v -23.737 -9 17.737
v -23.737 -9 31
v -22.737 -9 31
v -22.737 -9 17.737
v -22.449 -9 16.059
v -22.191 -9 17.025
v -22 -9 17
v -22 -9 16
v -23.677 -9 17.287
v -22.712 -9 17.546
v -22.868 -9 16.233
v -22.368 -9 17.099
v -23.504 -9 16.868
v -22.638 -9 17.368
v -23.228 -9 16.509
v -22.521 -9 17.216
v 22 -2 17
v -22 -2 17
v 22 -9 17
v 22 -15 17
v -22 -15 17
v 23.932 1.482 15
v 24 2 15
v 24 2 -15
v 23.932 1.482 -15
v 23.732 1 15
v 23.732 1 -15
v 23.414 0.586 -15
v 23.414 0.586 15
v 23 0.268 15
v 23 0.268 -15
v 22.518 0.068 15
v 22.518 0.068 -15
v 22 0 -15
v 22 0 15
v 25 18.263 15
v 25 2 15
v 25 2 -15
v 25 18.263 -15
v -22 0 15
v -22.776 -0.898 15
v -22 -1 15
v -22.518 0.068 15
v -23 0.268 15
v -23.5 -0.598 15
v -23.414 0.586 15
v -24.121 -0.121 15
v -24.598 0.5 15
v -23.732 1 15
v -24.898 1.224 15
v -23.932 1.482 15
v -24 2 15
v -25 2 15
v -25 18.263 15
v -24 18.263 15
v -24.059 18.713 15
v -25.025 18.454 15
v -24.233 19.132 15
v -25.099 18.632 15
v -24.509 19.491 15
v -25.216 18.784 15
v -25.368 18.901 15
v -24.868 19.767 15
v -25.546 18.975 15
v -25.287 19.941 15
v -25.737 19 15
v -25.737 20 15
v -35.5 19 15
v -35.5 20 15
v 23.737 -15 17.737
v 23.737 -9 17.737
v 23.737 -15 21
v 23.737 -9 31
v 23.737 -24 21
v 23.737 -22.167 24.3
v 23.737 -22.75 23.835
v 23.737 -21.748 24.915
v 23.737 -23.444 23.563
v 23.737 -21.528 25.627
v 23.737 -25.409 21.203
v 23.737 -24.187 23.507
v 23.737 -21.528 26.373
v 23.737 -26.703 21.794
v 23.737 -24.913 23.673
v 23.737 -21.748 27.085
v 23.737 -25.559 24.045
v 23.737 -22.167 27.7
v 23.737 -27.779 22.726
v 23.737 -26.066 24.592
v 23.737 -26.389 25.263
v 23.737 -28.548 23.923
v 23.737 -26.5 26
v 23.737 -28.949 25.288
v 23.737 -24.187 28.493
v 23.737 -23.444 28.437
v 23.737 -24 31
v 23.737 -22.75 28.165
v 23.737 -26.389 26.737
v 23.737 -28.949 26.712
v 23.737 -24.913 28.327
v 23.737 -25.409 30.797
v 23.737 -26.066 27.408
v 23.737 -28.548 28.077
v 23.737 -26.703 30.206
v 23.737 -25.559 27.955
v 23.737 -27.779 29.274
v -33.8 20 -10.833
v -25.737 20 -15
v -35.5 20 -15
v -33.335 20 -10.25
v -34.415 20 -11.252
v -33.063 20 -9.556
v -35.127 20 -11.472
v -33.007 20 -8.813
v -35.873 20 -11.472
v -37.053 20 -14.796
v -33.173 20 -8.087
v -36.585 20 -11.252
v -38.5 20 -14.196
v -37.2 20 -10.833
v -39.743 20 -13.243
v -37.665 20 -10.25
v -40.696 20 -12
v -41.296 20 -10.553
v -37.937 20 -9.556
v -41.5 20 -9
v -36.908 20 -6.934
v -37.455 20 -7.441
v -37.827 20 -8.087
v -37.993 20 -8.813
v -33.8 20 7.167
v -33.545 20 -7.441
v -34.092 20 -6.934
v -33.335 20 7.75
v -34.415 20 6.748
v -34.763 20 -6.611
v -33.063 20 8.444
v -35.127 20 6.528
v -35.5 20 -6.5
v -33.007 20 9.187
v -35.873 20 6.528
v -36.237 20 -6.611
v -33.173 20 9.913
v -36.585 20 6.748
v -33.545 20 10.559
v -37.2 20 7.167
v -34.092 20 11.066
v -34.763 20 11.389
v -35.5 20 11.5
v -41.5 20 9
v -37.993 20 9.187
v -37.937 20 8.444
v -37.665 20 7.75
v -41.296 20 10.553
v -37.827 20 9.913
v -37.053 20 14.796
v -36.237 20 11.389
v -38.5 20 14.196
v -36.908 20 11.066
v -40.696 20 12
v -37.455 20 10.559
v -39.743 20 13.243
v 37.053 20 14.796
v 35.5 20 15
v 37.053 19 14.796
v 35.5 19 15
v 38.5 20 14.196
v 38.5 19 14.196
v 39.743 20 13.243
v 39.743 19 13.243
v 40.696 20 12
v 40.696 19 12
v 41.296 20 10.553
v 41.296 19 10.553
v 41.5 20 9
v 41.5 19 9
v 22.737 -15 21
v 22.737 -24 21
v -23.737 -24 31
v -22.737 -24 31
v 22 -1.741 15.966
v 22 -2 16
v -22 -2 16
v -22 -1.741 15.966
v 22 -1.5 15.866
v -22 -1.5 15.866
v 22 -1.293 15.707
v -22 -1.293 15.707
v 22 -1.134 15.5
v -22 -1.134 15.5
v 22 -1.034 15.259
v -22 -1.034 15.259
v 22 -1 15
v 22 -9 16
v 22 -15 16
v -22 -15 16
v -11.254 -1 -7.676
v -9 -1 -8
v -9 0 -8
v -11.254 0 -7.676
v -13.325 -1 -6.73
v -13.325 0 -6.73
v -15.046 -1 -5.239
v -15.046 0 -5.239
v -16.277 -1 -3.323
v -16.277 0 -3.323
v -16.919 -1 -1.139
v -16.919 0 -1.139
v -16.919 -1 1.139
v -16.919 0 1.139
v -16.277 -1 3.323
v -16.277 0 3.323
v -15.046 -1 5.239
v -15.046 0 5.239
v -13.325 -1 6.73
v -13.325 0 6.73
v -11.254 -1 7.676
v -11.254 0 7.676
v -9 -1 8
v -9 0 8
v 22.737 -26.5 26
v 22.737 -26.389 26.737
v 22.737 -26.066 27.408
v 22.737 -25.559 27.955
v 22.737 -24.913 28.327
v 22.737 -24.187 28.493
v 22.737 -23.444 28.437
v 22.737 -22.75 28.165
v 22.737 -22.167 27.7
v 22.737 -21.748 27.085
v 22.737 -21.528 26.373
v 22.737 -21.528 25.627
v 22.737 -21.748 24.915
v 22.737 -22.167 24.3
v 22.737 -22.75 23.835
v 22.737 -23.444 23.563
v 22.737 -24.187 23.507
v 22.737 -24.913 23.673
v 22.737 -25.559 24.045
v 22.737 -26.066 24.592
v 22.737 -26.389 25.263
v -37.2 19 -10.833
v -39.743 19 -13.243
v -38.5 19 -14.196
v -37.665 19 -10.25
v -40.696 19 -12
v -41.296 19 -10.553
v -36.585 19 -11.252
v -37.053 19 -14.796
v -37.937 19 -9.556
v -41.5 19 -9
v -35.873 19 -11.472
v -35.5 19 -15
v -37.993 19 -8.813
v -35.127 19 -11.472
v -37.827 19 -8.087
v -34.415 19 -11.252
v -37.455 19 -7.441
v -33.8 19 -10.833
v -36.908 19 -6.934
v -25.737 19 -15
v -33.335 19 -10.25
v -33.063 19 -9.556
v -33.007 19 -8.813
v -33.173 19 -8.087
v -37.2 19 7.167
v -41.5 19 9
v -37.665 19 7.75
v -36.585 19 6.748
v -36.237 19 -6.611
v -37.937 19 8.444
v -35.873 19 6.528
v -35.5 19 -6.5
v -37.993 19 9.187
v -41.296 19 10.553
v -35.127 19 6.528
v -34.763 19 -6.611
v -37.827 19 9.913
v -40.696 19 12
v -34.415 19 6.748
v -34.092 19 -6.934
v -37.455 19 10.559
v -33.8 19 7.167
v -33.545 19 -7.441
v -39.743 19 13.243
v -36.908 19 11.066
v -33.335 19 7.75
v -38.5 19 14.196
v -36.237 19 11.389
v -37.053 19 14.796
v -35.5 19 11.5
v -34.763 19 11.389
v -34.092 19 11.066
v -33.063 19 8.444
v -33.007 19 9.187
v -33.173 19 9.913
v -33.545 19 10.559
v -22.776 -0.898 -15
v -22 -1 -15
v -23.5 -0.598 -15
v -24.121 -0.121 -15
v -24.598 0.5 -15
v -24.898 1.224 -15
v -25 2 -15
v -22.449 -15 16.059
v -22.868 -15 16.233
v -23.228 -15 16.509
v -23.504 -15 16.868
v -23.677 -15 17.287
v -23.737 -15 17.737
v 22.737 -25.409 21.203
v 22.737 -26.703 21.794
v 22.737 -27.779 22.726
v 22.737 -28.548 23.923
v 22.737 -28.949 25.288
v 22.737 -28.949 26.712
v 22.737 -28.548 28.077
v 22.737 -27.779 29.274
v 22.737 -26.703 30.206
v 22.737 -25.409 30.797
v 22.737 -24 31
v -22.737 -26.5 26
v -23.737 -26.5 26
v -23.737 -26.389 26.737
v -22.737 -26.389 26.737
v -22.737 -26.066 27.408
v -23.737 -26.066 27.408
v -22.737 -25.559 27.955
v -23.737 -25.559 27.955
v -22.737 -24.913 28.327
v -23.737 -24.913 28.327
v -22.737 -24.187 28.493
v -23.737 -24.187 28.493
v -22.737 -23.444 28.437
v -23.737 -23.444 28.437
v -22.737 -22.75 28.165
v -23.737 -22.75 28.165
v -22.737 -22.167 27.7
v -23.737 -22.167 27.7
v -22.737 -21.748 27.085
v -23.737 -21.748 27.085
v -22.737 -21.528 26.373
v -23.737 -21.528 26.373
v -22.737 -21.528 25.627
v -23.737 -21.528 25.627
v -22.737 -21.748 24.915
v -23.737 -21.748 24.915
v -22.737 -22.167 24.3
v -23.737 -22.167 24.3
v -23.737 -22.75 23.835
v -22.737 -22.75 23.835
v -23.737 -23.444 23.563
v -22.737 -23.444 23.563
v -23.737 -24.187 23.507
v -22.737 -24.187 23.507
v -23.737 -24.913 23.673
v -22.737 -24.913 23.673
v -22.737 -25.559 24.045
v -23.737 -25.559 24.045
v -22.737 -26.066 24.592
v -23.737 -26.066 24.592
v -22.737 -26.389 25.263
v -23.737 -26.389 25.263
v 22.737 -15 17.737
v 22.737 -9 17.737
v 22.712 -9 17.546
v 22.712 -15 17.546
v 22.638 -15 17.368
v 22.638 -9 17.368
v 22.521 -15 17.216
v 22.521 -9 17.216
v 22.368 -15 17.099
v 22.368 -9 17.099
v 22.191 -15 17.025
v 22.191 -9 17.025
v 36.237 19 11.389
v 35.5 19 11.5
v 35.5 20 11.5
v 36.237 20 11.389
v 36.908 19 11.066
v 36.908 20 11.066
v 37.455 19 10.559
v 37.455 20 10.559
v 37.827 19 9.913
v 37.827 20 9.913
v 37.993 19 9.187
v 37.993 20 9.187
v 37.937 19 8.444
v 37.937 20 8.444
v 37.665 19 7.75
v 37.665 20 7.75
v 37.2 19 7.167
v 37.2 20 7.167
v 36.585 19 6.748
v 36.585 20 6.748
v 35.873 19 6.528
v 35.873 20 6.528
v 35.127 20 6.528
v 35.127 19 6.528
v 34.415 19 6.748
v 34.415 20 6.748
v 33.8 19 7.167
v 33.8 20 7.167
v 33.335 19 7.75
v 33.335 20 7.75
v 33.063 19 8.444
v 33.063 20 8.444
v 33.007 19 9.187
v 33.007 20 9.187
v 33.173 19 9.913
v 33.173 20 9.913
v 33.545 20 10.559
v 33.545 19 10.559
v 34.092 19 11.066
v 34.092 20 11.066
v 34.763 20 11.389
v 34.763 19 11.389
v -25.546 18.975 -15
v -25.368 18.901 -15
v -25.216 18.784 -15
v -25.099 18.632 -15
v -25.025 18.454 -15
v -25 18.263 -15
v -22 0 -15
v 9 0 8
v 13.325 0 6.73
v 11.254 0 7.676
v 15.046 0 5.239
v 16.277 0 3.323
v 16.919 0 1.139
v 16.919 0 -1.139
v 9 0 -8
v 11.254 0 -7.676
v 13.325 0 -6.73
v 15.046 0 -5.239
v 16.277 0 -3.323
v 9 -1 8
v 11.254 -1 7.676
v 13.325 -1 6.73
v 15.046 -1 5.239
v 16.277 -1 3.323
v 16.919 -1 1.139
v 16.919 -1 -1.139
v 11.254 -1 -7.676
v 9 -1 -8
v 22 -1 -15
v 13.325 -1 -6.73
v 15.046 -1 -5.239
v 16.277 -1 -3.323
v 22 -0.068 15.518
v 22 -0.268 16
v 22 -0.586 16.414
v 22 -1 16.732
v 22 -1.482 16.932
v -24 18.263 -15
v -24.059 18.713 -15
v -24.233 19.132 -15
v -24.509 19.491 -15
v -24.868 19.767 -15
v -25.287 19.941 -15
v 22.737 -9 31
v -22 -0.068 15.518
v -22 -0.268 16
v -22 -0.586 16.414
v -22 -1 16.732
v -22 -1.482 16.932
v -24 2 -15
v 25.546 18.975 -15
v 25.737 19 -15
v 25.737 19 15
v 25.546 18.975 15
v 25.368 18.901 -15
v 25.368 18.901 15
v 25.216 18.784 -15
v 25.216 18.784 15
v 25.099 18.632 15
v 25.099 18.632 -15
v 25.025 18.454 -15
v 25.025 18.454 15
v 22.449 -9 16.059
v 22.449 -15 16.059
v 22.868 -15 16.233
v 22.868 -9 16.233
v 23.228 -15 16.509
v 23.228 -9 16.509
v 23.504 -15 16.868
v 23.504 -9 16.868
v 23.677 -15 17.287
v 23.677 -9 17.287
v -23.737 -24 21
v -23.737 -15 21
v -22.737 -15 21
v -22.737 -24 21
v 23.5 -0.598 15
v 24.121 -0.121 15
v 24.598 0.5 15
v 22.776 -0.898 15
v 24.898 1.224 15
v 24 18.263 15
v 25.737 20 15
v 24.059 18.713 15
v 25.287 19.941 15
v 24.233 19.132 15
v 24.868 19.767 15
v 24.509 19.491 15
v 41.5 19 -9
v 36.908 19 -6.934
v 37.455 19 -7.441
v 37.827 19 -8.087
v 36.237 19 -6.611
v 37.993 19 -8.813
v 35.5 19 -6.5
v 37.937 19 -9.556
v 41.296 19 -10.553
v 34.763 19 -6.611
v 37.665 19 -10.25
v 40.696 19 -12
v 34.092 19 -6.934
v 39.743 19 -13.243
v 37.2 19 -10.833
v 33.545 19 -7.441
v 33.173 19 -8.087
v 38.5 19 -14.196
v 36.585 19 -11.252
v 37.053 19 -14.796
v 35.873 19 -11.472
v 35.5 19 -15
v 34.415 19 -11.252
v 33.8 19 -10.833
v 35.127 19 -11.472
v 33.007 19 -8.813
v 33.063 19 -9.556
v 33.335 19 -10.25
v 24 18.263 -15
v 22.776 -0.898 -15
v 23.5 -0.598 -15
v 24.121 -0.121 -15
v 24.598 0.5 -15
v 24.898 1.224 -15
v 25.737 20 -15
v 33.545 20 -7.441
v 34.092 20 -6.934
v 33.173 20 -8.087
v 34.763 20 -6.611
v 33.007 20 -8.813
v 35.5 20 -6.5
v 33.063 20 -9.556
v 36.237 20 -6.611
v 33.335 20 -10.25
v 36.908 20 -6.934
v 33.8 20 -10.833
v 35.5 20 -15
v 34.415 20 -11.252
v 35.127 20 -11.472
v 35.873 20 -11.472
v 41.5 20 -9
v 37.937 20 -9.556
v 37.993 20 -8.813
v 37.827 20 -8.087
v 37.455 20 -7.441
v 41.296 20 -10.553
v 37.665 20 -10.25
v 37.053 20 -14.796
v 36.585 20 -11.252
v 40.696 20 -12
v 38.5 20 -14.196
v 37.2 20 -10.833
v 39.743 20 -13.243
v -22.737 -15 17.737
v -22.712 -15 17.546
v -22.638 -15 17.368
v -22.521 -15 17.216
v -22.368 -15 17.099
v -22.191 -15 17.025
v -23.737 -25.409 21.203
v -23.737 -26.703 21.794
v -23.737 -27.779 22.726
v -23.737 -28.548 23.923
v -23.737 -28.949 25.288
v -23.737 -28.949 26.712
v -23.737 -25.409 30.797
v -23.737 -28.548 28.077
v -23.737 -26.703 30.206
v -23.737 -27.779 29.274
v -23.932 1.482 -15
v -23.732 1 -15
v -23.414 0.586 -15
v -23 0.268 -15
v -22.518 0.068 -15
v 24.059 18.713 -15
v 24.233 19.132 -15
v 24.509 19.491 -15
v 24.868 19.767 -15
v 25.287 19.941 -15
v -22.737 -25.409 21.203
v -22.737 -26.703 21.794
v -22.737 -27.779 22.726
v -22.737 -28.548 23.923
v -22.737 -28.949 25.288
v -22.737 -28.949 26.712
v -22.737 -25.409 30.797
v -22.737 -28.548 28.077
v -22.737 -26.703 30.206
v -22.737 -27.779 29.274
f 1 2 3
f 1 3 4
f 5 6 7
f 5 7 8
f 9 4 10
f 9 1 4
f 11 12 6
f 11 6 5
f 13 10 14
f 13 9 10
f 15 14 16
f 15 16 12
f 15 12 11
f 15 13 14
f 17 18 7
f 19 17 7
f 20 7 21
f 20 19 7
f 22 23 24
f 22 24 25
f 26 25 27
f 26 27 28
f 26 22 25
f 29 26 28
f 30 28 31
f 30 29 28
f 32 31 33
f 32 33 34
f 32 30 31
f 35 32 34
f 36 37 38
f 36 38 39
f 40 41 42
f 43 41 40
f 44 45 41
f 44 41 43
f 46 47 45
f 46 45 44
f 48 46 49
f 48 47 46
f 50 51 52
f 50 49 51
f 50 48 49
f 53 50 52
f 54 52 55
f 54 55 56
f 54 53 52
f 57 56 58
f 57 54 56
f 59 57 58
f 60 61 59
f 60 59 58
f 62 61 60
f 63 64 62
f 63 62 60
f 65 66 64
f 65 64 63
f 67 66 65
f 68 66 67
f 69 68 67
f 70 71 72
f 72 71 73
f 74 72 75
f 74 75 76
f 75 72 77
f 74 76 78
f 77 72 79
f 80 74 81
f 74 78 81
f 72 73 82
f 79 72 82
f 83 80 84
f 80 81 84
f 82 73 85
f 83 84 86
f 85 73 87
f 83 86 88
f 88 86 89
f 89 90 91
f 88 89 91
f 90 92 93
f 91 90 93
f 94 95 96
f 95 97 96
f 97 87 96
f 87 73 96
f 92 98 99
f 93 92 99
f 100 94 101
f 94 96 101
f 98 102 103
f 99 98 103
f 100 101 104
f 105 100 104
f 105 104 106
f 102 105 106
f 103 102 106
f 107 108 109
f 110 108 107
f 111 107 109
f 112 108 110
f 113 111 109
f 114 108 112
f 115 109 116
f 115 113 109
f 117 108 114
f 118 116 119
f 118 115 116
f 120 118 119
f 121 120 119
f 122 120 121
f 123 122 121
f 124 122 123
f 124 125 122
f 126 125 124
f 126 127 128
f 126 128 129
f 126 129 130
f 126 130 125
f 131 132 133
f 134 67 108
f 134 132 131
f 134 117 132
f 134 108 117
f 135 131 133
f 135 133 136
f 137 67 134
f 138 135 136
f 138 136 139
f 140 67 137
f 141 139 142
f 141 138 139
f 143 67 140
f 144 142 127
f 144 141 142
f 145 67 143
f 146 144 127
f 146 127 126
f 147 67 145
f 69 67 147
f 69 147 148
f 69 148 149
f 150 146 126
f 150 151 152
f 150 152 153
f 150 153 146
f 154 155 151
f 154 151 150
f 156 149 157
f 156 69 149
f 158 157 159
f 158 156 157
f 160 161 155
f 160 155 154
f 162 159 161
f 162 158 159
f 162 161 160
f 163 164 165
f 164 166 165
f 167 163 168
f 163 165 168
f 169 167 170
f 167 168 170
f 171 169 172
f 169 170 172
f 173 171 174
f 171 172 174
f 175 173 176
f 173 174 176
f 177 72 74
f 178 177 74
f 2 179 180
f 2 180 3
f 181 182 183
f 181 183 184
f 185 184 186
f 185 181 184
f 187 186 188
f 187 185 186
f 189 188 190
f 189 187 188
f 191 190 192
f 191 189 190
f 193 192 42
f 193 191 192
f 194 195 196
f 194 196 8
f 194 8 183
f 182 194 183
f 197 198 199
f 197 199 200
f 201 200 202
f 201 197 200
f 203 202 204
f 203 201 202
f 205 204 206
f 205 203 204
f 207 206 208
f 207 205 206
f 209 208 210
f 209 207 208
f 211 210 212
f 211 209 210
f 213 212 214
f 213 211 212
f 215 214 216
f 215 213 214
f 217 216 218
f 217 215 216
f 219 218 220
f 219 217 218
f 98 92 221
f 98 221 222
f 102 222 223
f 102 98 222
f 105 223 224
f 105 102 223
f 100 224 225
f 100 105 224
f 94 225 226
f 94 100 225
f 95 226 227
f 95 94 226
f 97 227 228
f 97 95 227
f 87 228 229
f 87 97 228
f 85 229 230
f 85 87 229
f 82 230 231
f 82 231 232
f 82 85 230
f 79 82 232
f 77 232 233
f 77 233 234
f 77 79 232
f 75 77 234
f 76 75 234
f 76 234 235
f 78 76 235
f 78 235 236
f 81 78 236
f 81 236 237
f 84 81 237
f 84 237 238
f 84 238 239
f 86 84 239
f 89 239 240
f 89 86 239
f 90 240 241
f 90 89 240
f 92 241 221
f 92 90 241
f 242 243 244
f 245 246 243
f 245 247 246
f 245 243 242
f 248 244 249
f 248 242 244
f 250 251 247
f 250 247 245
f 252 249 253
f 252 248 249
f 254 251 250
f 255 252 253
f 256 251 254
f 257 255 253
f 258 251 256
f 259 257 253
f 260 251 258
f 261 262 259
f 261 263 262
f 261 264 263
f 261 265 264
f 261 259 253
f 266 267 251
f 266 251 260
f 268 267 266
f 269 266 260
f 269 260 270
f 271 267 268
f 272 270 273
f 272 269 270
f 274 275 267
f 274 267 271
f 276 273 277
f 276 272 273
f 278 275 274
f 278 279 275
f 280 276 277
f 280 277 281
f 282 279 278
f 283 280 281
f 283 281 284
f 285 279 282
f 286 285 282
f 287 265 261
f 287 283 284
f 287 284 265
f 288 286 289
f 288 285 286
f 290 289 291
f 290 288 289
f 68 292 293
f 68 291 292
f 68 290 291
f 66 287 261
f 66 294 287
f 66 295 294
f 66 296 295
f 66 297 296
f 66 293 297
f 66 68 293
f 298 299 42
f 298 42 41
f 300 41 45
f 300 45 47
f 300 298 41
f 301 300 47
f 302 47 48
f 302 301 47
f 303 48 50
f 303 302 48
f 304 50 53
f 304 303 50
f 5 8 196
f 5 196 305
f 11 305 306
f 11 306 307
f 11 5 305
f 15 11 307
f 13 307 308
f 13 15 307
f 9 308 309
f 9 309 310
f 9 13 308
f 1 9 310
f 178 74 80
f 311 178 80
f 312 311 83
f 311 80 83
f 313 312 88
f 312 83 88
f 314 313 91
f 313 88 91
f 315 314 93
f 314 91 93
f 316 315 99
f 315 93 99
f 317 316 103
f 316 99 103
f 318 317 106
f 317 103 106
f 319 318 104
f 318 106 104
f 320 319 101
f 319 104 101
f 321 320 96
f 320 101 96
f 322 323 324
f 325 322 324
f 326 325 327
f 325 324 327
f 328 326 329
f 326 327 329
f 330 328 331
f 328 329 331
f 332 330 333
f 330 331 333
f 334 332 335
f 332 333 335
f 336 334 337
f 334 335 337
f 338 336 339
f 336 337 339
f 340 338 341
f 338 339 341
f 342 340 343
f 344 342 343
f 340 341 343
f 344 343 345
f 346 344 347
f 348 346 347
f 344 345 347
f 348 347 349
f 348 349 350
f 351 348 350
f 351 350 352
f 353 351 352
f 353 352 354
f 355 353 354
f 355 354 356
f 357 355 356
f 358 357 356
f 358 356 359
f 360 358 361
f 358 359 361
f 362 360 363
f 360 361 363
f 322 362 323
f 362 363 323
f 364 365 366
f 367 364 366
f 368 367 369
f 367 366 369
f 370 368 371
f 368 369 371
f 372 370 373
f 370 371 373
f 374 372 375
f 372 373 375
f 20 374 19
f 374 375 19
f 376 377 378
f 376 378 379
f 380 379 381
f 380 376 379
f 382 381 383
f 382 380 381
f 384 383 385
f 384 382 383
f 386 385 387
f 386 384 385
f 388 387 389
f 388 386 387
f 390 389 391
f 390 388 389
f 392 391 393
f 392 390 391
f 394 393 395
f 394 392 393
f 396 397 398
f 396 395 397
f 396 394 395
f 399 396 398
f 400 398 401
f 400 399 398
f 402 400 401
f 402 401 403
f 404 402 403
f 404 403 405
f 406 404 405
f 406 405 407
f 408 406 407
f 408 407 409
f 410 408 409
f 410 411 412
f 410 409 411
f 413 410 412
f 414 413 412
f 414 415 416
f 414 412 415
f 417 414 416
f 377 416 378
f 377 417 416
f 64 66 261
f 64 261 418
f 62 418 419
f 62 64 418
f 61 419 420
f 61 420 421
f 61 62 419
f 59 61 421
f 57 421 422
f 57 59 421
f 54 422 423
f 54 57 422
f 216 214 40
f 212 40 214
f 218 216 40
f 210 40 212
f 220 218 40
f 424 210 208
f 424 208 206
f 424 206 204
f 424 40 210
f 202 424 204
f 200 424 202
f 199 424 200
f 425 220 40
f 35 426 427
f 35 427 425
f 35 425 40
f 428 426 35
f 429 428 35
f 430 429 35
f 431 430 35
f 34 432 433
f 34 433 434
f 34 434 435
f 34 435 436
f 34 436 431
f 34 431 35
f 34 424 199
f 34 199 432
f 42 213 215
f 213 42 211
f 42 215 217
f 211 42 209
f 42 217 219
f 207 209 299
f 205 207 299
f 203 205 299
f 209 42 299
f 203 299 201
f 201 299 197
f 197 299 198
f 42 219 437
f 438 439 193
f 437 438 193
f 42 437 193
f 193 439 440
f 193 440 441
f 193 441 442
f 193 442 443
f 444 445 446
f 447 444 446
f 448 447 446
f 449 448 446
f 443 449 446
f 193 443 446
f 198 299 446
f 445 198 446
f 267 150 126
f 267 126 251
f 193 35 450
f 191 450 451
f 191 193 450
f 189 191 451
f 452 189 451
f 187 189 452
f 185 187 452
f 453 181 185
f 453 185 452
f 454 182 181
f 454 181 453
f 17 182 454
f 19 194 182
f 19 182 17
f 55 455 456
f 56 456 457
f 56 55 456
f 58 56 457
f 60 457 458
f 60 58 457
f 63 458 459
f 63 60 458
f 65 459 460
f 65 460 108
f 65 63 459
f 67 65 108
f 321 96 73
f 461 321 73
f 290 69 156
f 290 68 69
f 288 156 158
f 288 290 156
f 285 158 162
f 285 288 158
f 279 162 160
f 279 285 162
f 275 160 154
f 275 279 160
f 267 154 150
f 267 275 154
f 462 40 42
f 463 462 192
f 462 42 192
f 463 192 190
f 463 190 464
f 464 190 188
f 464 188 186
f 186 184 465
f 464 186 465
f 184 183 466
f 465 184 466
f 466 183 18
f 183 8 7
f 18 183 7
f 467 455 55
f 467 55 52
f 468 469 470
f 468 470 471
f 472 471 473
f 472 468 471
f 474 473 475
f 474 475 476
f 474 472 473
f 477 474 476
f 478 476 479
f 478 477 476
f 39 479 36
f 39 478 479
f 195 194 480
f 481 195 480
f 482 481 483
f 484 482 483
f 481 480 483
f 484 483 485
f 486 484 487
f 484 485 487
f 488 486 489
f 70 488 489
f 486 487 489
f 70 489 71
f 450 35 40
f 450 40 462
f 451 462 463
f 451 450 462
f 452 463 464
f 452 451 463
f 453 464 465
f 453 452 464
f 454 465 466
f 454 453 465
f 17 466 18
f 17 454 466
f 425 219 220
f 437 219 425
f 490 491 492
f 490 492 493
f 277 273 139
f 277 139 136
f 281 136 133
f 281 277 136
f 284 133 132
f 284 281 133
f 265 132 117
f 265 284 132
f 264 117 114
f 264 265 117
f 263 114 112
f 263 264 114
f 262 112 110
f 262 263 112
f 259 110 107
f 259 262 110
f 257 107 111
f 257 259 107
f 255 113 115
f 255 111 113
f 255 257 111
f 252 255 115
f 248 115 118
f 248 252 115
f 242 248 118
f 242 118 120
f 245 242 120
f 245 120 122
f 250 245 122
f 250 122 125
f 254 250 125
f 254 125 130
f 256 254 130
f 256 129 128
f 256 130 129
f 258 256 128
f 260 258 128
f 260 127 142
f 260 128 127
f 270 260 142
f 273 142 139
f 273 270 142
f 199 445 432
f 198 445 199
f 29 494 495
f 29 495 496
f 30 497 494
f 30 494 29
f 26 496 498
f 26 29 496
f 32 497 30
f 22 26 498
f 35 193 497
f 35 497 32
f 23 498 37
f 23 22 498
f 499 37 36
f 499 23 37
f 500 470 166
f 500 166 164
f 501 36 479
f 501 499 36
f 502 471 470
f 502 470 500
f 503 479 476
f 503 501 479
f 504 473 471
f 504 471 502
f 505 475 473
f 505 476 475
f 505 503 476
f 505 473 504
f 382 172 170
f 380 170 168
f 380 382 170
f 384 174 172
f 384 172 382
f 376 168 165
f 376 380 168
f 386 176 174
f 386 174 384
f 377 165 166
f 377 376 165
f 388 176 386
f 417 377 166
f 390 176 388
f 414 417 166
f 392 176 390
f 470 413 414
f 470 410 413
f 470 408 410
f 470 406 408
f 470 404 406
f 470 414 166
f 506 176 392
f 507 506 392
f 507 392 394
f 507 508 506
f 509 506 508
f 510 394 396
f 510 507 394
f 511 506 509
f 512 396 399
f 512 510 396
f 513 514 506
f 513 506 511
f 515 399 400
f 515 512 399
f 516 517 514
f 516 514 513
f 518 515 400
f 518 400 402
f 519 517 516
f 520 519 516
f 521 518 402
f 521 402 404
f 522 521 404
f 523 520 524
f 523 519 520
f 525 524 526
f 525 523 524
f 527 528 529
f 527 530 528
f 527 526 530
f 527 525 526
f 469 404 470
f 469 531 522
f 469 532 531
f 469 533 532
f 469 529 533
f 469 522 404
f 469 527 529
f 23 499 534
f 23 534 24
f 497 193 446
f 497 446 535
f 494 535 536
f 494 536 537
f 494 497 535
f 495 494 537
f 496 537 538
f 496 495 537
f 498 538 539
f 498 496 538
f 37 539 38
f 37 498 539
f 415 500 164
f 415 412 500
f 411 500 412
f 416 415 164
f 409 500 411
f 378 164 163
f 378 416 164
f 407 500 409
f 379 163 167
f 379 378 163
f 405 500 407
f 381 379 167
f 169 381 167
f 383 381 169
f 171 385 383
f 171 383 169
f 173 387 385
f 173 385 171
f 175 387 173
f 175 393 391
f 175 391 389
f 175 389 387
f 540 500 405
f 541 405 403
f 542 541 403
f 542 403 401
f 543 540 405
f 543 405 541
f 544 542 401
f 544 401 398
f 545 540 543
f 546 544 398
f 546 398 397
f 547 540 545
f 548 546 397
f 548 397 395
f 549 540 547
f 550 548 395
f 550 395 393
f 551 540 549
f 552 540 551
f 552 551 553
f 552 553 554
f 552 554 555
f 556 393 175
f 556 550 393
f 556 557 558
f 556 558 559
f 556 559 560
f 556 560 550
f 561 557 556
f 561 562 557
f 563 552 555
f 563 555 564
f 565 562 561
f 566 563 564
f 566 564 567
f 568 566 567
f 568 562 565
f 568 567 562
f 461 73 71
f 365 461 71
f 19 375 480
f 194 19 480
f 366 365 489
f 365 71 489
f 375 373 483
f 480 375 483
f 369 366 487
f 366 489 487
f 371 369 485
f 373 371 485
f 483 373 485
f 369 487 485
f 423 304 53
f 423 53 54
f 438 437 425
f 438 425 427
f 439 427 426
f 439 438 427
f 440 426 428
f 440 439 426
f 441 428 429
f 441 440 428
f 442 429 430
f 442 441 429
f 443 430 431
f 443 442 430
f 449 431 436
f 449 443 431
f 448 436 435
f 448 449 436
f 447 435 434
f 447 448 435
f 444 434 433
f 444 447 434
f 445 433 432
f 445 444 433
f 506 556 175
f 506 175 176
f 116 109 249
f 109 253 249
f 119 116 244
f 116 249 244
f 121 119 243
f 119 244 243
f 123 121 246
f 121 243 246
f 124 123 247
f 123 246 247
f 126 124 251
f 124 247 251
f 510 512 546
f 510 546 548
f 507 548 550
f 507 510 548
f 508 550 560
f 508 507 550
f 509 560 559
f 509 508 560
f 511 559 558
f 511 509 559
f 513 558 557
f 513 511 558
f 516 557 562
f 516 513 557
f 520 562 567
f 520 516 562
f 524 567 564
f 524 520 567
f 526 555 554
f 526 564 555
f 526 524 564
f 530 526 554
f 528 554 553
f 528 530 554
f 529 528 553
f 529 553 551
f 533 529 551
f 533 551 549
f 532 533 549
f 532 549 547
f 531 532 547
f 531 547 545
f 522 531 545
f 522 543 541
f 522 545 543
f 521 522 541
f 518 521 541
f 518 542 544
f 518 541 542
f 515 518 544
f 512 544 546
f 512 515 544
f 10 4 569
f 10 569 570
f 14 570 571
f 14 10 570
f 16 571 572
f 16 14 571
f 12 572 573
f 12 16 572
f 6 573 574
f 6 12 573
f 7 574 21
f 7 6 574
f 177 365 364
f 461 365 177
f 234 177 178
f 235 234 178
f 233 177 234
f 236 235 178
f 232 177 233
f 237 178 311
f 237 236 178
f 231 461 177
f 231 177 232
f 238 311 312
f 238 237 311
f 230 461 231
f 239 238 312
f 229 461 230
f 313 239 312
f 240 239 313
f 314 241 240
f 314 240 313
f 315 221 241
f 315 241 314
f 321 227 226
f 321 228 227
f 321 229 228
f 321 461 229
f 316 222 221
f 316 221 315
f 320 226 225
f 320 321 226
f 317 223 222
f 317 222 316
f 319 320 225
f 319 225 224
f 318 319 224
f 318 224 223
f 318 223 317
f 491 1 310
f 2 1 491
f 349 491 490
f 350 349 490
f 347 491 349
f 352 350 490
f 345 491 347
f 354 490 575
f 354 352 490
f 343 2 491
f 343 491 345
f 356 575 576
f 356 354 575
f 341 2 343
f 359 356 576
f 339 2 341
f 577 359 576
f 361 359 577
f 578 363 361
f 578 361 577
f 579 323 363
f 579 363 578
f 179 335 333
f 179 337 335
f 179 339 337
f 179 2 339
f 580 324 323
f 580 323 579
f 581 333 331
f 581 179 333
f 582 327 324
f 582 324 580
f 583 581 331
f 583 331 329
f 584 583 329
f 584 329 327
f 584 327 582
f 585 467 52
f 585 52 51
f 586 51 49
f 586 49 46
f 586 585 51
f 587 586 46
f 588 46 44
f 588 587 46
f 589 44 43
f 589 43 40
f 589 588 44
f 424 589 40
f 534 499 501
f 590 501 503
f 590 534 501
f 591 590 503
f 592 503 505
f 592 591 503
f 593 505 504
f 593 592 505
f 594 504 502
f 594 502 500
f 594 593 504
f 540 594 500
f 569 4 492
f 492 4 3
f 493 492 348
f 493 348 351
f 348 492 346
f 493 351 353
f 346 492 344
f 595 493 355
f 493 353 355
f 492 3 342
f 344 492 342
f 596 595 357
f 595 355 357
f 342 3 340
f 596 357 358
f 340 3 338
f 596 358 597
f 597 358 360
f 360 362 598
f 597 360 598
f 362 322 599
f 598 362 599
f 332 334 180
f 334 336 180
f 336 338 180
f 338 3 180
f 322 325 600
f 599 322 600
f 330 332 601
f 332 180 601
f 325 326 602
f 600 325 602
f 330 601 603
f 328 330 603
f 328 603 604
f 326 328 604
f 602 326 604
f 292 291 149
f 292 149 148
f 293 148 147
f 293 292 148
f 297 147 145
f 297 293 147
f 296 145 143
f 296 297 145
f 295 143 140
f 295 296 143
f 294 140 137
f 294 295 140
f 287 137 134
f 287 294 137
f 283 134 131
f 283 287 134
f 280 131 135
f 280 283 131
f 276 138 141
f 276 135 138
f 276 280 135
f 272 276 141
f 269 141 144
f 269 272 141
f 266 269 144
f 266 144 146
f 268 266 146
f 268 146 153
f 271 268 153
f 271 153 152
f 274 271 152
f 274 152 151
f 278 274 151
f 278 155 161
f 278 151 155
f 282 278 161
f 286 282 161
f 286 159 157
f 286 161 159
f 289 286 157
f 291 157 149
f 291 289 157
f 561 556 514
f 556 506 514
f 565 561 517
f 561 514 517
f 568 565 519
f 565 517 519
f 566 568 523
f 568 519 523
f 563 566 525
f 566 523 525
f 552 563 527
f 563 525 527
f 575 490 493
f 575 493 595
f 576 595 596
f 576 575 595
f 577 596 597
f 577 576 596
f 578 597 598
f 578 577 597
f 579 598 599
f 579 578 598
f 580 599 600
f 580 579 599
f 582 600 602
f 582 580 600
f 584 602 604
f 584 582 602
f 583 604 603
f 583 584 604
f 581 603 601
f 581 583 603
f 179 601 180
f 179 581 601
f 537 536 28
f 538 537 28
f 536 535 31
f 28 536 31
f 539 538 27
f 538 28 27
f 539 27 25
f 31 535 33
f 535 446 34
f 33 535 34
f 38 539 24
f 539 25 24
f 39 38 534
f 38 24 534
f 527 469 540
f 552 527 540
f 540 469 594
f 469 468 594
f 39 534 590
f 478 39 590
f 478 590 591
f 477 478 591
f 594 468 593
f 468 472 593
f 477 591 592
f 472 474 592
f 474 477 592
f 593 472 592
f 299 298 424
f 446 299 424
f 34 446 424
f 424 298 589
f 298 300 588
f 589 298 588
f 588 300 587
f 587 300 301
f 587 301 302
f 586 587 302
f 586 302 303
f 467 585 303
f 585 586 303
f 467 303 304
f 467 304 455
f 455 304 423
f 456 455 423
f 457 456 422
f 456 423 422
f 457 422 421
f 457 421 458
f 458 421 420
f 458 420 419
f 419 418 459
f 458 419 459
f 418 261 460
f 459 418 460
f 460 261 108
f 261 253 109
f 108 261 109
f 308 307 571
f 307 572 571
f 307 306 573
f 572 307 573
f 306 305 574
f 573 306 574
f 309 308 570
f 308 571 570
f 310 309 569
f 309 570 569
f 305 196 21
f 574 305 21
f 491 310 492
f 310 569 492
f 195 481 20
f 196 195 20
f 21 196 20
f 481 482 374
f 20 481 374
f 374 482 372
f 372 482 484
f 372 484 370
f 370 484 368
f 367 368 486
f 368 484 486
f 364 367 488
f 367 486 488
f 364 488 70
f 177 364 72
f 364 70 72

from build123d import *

# Parameters (mm, degrees)
SKETCH1_W                      = 50
SKETCH1_H                      = 30
BASE_FLANGE1_DEPTH             = 1
EDGE_FLANGE1_STRIP_W           = 8
EDGE_FLANGE1_STRIP_H           = 1
EDGE_FLANGE1_STRIP_CUT_DEPTH   = 30
EDGE_FLANGE1_STRIP_2_W         = 8
EDGE_FLANGE1_STRIP_2_H         = 1
EDGE_FLANGE1_STRIP_CUT_2_DEPTH = 30
EDGE_FLANGE1_DEPTH             = 30
EDGE_FLANGE1_BEND_DEPTH        = 30
EDGE_FLANGE2_STRIP_W           = 5.4732
EDGE_FLANGE2_STRIP_H           = 1
EDGE_FLANGE2_STRIP_CUT_DEPTH   = 30
EDGE_FLANGE2_STRIP_2_W         = 5.4732
EDGE_FLANGE2_STRIP_2_H         = 1
EDGE_FLANGE2_STRIP_CUT_2_DEPTH = 30
EDGE_FLANGE2_DEPTH             = 30
EDGE_FLANGE2_BEND_DEPTH        = 30
EDGE_FLANGE3_DEPTH             = 44
EDGE_FLANGE4_DEPTH             = 6
EDGE_FLANGE4_START             = 1
EDGE_FLANGE4_PROFILE_R         = 2.5
EDGE_FLANGE4_FLAT_DEPTH        = 1
CUT_EXTRUDE1_DEPTH             = 60.36539396
CUT_EXTRUDE1_DEPTH_BACK        = 60.36539396
SKETCH38_R                     = 2.5
FILLET1_R                      = 6


# Sheet-metal steps are written as plain solids
with BuildPart() as part:
    # Sketch1 → Base-Flange1 (new body)
    with BuildSketch(Plane(origin=(0, 0, 0), x_dir=(1, 0, 0), z_dir=(0, 1, 0))):
        Rectangle(SKETCH1_W, SKETCH1_H)
    extrude(amount=-BASE_FLANGE1_DEPTH)

    # Edge-Flange1 strip (across the edge) → Edge-Flange1 strip cut (cut)
    with BuildSketch(Plane(origin=(25, 0, 15), x_dir=(-1, 0, 0), z_dir=(0, 0, -1))):
        with Locations((-1, -0.5)):
            Rectangle(EDGE_FLANGE1_STRIP_W, EDGE_FLANGE1_STRIP_H)
    extrude(amount=EDGE_FLANGE1_STRIP_CUT_DEPTH, mode=Mode.SUBTRACT)

    # Edge-Flange1 strip 2 (across the edge) → Edge-Flange1 strip cut 2 (cut)
    with BuildSketch(Plane(origin=(-25, 0, -15), x_dir=(1, 0, 0), z_dir=(0, 0, 1))):
        with Locations((-1, -0.5)):
            Rectangle(EDGE_FLANGE1_STRIP_2_W, EDGE_FLANGE1_STRIP_2_H)
    extrude(amount=EDGE_FLANGE1_STRIP_CUT_2_DEPTH, mode=Mode.SUBTRACT)

    # Edge-Flange1 section (across the edge) → Edge-Flange1 (add)
    with BuildSketch(Plane(origin=(25, 0, 15), x_dir=(-1, 0, 0), z_dir=(0, 0, -1))):
        with BuildLine():
            Line((0, 2), (0, 19))
            Line((0, 19), (1, 19))
            Line((1, 19), (1, 2))
            ThreePointArc((1, 2), (1.585786438, 0.585786438), (3, 0))
            Line((3, 0), (3, -1))
            ThreePointArc((3, -1), (0.878679656, -0.121320344), (0, 2))
        make_face()
    extrude(amount=EDGE_FLANGE1_DEPTH)

    # Edge-Flange1 section 2 (across the edge) → Edge-Flange1 bend (add)
    with BuildSketch(Plane(origin=(-25, 0, -15), x_dir=(1, 0, 0), z_dir=(0, 0, 1))):
        with BuildLine():
            Line((0, 2), (0, 19))
            Line((0, 19), (1, 19))
            Line((1, 19), (1, 2))
            ThreePointArc((1, 2), (1.585786438, 0.585786438), (3, 0))
            Line((3, 0), (3, -1))
            ThreePointArc((3, -1), (0.878679656, -0.121320344), (0, 2))
        make_face()
    extrude(amount=EDGE_FLANGE1_BEND_DEPTH)

    # Edge-Flange2 strip (across the edge) → Edge-Flange2 strip cut (cut)
    with BuildSketch(Plane(origin=(25, 19, -15), x_dir=(0, -1, 0), z_dir=(0, 0, 1))):
        with Locations((-2, -0.5)):
            Rectangle(EDGE_FLANGE2_STRIP_W, EDGE_FLANGE2_STRIP_H)
    extrude(amount=EDGE_FLANGE2_STRIP_CUT_DEPTH, mode=Mode.SUBTRACT)

    # Edge-Flange2 strip 2 (across the edge) → Edge-Flange2 strip cut 2 (cut)
    with BuildSketch(Plane(origin=(-25, 19, 15), x_dir=(0, -1, 0), z_dir=(0, 0, -1))):
        with Locations((-2, -0.5)):
            Rectangle(EDGE_FLANGE2_STRIP_2_W, EDGE_FLANGE2_STRIP_2_H)
    extrude(amount=EDGE_FLANGE2_STRIP_CUT_2_DEPTH, mode=Mode.SUBTRACT)

    # Edge-Flange2 section (across the edge) → Edge-Flange2 (add)
    with BuildSketch(Plane(origin=(25, 19, -15), x_dir=(0, -1, 0), z_dir=(0, 0, 1))):
        with BuildLine():
            Line((-1, 0.7366), (-1, 16.5))
            Line((-1, 16.5), (0, 16.5))
            Line((0, 16.5), (0, 0.7366))
            ThreePointArc((0, 0.7366), (0.215745145, 0.215745145), (0.7366, 0))
            Line((0.7366, 0), (0.7366, -1))
            ThreePointArc((0.7366, -1), (-0.491361636, -0.491361636), (-1, 0.7366))
        make_face()
    extrude(amount=EDGE_FLANGE2_DEPTH)

    # Edge-Flange2 section 2 (across the edge) → Edge-Flange2 bend (add)
    with BuildSketch(Plane(origin=(-25, 19, 15), x_dir=(0, -1, 0), z_dir=(0, 0, -1))):
        with BuildLine():
            Line((-1, 0.7366), (-1, 16.5))
            Line((-1, 16.5), (0, 16.5))
            Line((0, 16.5), (0, 0.7366))
            ThreePointArc((0, 0.7366), (0.215745145, 0.215745145), (0.7366, 0))
            Line((0.7366, 0), (0.7366, -1))
            ThreePointArc((0.7366, -1), (-0.491361636, -0.491361636), (-1, 0.7366))
        make_face()
    extrude(amount=EDGE_FLANGE2_BEND_DEPTH)

    # Edge-Flange3 section (across the edge) → Edge-Flange3 (add)
    with BuildSketch(Plane(origin=(22, -1, 16), x_dir=(0, 0, -1), z_dir=(-1, 0, 0))):
        with BuildLine():
            Line((-1, 1), (-1, 14))
            Line((-1, 14), (0, 14))
            Line((0, 14), (0, 1))
            ThreePointArc((0, 1), (0.292893219, 0.292893219), (1, 0))
            Line((1, 0), (1, -1))
            ThreePointArc((1, -1), (-0.414213562, -0.414213562), (-1, 1))
        make_face()
    extrude(amount=EDGE_FLANGE3_DEPTH)

    # Edge-Flange4 bend section (across the edge) → Edge-Flange4 (add)
    with BuildSketch(Plane(origin=(-22.7366, -9, 17), x_dir=(1, 0, 0), z_dir=(0, -1, 0))):
        with BuildLine():
            Line((-1, 0.7366), (0, 0.7366))
            ThreePointArc((0, 0.7366), (0.215745145, 0.215745145), (0.7366, 0))
            Line((0.7366, 0), (0.7366, -1))
            ThreePointArc((0.7366, -1), (-0.491361636, -0.491361636), (-1, 0.7366))
        make_face()
    edge_flange4 = extrude(amount=EDGE_FLANGE4_DEPTH)

    # Edge-Flange4 profile (on flange) → Edge-Flange4 flat (add)
    with BuildSketch(Plane(origin=(-22.7366, 0, 17), x_dir=(0, -1, 0), z_dir=(-1, 0, 0)).offset(EDGE_FLANGE4_START)):
        with BuildLine():
            Line((9, 14), (9, 0.7366))
            Line((9, 0.7366), (15, 0.7366))
            Line((15, 0.7366), (15, 4))
            Line((15, 4), (24, 4))
            ThreePointArc((24, 4), (29, 9), (24, 14))
            Line((24, 14), (9, 14))
        make_face()
        with Locations((24, 9)):
            Circle(EDGE_FLANGE4_PROFILE_R, mode=Mode.SUBTRACT)
    edge_flange4_flat = extrude(amount=-EDGE_FLANGE4_FLAT_DEPTH)

    # Mirror1: Edge-Flange4, Edge-Flange4 flat across plane
    add(edge_flange4.mirror(Plane(origin=(0, 0, 0), x_dir=(0, 0, 1), z_dir=(1, 0, 0))))
    add(edge_flange4_flat.mirror(Plane(origin=(0, 0, 0), x_dir=(0, 0, 1), z_dir=(1, 0, 0))))

    # Sketch38 → Cut-Extrude1 (cut, two sides: drawn at the far end of the back side and taken through both)
    with BuildSketch(Plane(origin=(0, 0, 0), x_dir=(1, 0, 0), z_dir=(0, 1, 0)).offset(-CUT_EXTRUDE1_DEPTH_BACK)):
        with Locations(Location((-35.5, 9, 0), (0, 0, 270))):
            Circle(SKETCH38_R)
        with Locations(Location((-35.5, -9, 0), (0, 0, 270))):
            Circle(SKETCH38_R)
        with BuildLine():
            Line((-9, -8), (9, -8))
            ThreePointArc((9, -8), (17, 0), (9, 8))
            Line((9, 8), (-9, 8))
            ThreePointArc((-9, 8), (-17, 0), (-9, -8))
        make_face()
        with Locations(Location((35.5, 9, 0), (0, 0, 270))):
            Circle(SKETCH38_R)
        with Locations(Location((35.5, -9, 0), (0, 0, 270))):
            Circle(SKETCH38_R)
    extrude(amount=CUT_EXTRUDE1_DEPTH + CUT_EXTRUDE1_DEPTH_BACK, mode=Mode.SUBTRACT)

    # Fillet1
    fillet1_edges = [part.edges().sort_by_distance(p)[0] for p in [
        (41.5, 19.5, -15),
        (41.5, 19.5, 15),
        (-41.5, 19.5, 15),
        (-41.5, 19.5, -15),
    ]]
    fillet(fillet1_edges, radius=FILLET1_R)


solid = part.part
